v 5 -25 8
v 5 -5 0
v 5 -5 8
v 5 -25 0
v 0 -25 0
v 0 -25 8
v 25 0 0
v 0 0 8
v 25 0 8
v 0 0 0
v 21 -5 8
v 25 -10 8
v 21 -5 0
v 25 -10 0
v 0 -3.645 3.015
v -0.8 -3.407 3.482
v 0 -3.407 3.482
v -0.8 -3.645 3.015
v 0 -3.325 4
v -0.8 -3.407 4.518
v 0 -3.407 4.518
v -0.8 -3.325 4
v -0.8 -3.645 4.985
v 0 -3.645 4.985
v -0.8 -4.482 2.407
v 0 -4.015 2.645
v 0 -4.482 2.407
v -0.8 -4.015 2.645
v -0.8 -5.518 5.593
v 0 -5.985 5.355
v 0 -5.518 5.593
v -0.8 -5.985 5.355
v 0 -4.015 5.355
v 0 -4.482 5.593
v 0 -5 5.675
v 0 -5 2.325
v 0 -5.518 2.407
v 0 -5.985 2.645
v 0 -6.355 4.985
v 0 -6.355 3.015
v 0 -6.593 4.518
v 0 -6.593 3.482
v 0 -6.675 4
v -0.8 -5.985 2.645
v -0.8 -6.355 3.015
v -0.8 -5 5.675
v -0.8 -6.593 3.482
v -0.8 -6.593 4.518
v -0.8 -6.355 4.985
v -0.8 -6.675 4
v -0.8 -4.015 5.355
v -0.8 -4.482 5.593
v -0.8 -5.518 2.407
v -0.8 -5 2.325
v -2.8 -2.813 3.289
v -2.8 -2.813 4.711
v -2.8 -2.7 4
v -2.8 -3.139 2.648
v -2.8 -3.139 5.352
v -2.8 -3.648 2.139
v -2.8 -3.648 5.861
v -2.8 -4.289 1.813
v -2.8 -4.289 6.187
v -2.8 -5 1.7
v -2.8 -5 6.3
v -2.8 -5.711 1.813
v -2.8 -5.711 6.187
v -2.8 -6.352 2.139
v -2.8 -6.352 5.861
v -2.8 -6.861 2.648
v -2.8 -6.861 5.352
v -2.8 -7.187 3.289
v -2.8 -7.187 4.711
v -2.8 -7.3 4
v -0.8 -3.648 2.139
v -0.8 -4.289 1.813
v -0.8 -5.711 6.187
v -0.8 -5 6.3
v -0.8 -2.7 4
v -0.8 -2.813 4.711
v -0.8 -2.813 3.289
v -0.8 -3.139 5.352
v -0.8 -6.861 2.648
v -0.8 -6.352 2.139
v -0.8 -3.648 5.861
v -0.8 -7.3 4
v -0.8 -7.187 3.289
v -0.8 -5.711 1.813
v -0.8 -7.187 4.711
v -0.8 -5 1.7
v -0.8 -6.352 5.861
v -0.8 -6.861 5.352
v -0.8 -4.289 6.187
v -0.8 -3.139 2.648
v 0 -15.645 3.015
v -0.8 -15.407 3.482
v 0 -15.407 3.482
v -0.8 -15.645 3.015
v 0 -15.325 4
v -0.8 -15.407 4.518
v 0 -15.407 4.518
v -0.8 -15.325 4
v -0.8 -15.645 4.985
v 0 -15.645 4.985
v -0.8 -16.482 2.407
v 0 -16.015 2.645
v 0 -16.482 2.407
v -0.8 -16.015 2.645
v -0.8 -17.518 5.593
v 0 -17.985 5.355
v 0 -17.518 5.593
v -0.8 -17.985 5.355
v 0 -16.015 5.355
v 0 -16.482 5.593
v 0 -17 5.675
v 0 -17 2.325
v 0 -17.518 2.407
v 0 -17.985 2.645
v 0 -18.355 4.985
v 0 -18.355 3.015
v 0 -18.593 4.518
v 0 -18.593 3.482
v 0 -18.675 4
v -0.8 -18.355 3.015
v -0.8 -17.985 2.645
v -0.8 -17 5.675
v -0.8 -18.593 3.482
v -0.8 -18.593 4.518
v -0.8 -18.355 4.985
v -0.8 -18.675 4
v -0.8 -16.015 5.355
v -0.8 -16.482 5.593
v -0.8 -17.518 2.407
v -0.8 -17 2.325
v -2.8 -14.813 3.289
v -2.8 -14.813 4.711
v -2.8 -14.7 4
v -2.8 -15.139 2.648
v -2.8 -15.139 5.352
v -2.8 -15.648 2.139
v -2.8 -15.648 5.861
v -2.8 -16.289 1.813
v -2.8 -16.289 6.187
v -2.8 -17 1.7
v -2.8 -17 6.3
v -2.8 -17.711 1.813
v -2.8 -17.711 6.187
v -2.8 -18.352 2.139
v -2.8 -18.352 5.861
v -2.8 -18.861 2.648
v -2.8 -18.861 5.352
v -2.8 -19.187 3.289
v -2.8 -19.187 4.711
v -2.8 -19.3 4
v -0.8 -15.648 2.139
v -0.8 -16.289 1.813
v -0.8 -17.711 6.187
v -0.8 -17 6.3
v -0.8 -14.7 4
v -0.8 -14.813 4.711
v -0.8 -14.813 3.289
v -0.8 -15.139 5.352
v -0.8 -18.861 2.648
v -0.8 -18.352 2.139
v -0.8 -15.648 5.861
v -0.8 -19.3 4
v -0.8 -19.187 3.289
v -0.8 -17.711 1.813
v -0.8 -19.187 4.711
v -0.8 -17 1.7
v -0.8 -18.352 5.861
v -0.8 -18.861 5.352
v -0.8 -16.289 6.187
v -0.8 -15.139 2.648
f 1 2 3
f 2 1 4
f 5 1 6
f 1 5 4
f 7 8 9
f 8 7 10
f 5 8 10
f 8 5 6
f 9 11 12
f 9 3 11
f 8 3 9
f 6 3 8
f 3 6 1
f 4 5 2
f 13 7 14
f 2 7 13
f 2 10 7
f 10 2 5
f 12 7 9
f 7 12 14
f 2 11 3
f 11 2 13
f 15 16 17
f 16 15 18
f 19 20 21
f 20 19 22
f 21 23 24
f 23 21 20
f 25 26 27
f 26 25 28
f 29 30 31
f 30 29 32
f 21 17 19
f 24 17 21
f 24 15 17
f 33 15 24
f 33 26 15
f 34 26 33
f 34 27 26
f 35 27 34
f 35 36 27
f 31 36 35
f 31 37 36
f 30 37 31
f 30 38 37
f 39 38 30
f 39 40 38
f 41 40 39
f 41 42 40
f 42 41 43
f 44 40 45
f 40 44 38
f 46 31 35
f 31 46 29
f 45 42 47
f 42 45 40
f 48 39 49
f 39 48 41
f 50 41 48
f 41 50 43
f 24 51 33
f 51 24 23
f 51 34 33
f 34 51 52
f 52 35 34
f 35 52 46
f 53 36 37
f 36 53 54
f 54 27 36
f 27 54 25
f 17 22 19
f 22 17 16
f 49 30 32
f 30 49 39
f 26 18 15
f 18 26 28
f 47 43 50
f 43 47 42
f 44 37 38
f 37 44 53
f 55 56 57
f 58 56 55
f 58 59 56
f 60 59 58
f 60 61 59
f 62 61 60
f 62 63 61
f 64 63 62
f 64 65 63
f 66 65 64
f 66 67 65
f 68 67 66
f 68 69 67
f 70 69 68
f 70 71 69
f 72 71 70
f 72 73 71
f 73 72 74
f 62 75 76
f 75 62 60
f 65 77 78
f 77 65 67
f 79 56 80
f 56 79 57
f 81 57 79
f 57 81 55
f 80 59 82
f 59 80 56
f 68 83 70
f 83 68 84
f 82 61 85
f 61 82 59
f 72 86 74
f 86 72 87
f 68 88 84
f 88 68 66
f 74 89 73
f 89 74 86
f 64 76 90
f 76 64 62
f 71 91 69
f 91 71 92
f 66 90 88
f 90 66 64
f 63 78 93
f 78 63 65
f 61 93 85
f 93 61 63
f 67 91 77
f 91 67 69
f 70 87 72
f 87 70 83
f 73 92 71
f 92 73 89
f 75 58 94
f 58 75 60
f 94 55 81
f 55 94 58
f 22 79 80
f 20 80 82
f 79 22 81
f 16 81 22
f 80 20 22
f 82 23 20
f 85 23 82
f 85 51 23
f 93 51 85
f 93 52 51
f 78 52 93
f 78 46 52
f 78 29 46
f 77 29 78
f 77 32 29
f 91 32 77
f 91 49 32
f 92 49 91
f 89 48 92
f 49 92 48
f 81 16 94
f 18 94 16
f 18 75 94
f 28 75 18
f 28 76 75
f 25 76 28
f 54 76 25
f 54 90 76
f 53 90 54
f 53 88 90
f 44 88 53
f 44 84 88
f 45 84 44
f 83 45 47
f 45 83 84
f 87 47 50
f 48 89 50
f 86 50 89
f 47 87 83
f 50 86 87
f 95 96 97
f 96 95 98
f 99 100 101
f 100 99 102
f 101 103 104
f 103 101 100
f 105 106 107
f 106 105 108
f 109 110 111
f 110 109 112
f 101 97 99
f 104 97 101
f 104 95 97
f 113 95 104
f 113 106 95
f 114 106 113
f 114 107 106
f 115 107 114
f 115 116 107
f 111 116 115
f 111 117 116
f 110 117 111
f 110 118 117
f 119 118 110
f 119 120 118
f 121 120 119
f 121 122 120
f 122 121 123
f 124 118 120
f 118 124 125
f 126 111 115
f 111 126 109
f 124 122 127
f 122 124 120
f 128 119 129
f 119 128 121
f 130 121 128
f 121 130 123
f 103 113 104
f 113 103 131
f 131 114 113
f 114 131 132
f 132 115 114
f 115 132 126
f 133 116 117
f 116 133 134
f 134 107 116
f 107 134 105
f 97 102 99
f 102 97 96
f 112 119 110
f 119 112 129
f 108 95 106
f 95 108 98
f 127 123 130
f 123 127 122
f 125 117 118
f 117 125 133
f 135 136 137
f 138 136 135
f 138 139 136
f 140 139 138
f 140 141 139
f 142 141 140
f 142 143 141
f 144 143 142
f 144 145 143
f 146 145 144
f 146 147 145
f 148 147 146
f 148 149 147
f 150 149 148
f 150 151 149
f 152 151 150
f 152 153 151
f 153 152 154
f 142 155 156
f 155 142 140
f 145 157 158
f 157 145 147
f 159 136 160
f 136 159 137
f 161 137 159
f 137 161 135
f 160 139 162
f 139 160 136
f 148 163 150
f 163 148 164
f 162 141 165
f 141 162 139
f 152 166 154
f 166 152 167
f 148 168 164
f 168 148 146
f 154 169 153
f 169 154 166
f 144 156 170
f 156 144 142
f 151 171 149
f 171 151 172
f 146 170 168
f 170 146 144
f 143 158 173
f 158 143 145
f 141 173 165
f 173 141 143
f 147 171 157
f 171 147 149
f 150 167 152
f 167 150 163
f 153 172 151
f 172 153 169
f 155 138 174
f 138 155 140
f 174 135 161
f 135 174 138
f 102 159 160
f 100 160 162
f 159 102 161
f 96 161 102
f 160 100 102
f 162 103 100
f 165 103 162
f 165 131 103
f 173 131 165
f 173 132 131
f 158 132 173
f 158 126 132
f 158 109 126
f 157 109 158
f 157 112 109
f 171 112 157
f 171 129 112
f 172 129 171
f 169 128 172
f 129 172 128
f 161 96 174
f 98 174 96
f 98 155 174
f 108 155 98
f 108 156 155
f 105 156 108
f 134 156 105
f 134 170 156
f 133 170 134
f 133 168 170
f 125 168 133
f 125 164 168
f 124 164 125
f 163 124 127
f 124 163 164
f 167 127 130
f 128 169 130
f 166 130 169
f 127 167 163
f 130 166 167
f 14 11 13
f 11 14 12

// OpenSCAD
// Small hook for tool walls using the european "Eurolochung" pattern
// Author: Peter Jochum <peter.jochum@aau.at>

//include <utils/build_plate.scad>

// Length of the hook (horizontal part)
length = 25; // [15:60]

// Height of the hook (vertical part)
height = 25; // [10:50]

// Width of the hook
width = 8; // [5:30]

// Height of the horizontal hook part
height_bottom = 5; // [3:10]

// width the wall hook part
width_wall = 5; // [3:10]

// Sizes and type of hook end
hook_end_length = 4; // how deep the end of the hook is
hook_end_height = 5;  // height of the end of the hook

// Type of the hook end
hook_end_type = "triangle";  // [square,triangle]

// Sizes regarding the holders for your tool wall
// Space between holes in tool wall (12 and 15mm seem to be common)
hole_vertical_distance = 12;

// Diameter of the holes
hole_diameter = 5;

// Length of the holding cylinders
holder_height = 2; // [0.0:10.0]

// Thickness of the metal - a smaller cylinder is created along this distance
metal_thickness = 1; 

// This value is subtracted from the cylinders to make holders fit easier into the wall holes
fitting_modifier = 0.2;


// Performance variables
cylinder_segments = 20*1; // how detailed the segments of the used cylinders are

// Calculated variables (DO NOT TOUCH)
spacer_height = metal_thickness + fitting_modifier; // add fitting_modifier for an easier fit
hole_radius = hole_diameter / 2;


// Main body of the hook, a cube
module body() {
    union() {
    color("Lightblue") cube([width_wall, width, height]);
        translate([width_wall, 0, 0]) {
            color("Red") cube([length-width_wall, width, height_bottom]);
        }
    }
}

module hook_end() {
    translate([length-hook_end_length,0,height_bottom]) {
        if(hook_end_type == "square")  hook_end_square(); 
        if (hook_end_type == "triangle") hook_end_triangle();
    }
}

// Adds a square end to the hook so tools don't fall off
module hook_end_square() {
    color("Green") cube([hook_end_length, width, hook_end_height]);
}

// Adds a triangular end to the hook for easier removal of tools
module hook_end_triangle() {
    hook_points = [[0,0], [hook_end_length,0], [hook_end_length, hook_end_height]];
    translate([0,width, 0]) {
        rotate([90, 0, 0]) {
            linear_extrude(height=width) {
                polygon(points=hook_points);
            }
        }
    }
}

module hole_mount() {
    rotate([0,90,0]) {
        union () {
                cylinder(h=spacer_height, r=hole_radius*0.67, center=true,  $fn=cylinder_segments);
            translate([0, 0, -spacer_height]) {
                cylinder(h=holder_height, r=hole_radius-fitting_modifier, center=true, $fn=cylinder_segments); // fitting modifier is subracted from the radius to facliate insertion
            }
        }
    }
}

rotate([90,0,0]) { // Part will be printed sideways
    union () {
        body();
        hook_end();
         translate([-spacer_height/2,  width/2,  0]) {
             for(i=[0:1]) {
                 translate([0,0,height*.1 + hole_radius + (i*hole_vertical_distance)]) {
                        hole_mount();
                 }
             }
         }
     }
 }

//build_plate(3,250,210);
